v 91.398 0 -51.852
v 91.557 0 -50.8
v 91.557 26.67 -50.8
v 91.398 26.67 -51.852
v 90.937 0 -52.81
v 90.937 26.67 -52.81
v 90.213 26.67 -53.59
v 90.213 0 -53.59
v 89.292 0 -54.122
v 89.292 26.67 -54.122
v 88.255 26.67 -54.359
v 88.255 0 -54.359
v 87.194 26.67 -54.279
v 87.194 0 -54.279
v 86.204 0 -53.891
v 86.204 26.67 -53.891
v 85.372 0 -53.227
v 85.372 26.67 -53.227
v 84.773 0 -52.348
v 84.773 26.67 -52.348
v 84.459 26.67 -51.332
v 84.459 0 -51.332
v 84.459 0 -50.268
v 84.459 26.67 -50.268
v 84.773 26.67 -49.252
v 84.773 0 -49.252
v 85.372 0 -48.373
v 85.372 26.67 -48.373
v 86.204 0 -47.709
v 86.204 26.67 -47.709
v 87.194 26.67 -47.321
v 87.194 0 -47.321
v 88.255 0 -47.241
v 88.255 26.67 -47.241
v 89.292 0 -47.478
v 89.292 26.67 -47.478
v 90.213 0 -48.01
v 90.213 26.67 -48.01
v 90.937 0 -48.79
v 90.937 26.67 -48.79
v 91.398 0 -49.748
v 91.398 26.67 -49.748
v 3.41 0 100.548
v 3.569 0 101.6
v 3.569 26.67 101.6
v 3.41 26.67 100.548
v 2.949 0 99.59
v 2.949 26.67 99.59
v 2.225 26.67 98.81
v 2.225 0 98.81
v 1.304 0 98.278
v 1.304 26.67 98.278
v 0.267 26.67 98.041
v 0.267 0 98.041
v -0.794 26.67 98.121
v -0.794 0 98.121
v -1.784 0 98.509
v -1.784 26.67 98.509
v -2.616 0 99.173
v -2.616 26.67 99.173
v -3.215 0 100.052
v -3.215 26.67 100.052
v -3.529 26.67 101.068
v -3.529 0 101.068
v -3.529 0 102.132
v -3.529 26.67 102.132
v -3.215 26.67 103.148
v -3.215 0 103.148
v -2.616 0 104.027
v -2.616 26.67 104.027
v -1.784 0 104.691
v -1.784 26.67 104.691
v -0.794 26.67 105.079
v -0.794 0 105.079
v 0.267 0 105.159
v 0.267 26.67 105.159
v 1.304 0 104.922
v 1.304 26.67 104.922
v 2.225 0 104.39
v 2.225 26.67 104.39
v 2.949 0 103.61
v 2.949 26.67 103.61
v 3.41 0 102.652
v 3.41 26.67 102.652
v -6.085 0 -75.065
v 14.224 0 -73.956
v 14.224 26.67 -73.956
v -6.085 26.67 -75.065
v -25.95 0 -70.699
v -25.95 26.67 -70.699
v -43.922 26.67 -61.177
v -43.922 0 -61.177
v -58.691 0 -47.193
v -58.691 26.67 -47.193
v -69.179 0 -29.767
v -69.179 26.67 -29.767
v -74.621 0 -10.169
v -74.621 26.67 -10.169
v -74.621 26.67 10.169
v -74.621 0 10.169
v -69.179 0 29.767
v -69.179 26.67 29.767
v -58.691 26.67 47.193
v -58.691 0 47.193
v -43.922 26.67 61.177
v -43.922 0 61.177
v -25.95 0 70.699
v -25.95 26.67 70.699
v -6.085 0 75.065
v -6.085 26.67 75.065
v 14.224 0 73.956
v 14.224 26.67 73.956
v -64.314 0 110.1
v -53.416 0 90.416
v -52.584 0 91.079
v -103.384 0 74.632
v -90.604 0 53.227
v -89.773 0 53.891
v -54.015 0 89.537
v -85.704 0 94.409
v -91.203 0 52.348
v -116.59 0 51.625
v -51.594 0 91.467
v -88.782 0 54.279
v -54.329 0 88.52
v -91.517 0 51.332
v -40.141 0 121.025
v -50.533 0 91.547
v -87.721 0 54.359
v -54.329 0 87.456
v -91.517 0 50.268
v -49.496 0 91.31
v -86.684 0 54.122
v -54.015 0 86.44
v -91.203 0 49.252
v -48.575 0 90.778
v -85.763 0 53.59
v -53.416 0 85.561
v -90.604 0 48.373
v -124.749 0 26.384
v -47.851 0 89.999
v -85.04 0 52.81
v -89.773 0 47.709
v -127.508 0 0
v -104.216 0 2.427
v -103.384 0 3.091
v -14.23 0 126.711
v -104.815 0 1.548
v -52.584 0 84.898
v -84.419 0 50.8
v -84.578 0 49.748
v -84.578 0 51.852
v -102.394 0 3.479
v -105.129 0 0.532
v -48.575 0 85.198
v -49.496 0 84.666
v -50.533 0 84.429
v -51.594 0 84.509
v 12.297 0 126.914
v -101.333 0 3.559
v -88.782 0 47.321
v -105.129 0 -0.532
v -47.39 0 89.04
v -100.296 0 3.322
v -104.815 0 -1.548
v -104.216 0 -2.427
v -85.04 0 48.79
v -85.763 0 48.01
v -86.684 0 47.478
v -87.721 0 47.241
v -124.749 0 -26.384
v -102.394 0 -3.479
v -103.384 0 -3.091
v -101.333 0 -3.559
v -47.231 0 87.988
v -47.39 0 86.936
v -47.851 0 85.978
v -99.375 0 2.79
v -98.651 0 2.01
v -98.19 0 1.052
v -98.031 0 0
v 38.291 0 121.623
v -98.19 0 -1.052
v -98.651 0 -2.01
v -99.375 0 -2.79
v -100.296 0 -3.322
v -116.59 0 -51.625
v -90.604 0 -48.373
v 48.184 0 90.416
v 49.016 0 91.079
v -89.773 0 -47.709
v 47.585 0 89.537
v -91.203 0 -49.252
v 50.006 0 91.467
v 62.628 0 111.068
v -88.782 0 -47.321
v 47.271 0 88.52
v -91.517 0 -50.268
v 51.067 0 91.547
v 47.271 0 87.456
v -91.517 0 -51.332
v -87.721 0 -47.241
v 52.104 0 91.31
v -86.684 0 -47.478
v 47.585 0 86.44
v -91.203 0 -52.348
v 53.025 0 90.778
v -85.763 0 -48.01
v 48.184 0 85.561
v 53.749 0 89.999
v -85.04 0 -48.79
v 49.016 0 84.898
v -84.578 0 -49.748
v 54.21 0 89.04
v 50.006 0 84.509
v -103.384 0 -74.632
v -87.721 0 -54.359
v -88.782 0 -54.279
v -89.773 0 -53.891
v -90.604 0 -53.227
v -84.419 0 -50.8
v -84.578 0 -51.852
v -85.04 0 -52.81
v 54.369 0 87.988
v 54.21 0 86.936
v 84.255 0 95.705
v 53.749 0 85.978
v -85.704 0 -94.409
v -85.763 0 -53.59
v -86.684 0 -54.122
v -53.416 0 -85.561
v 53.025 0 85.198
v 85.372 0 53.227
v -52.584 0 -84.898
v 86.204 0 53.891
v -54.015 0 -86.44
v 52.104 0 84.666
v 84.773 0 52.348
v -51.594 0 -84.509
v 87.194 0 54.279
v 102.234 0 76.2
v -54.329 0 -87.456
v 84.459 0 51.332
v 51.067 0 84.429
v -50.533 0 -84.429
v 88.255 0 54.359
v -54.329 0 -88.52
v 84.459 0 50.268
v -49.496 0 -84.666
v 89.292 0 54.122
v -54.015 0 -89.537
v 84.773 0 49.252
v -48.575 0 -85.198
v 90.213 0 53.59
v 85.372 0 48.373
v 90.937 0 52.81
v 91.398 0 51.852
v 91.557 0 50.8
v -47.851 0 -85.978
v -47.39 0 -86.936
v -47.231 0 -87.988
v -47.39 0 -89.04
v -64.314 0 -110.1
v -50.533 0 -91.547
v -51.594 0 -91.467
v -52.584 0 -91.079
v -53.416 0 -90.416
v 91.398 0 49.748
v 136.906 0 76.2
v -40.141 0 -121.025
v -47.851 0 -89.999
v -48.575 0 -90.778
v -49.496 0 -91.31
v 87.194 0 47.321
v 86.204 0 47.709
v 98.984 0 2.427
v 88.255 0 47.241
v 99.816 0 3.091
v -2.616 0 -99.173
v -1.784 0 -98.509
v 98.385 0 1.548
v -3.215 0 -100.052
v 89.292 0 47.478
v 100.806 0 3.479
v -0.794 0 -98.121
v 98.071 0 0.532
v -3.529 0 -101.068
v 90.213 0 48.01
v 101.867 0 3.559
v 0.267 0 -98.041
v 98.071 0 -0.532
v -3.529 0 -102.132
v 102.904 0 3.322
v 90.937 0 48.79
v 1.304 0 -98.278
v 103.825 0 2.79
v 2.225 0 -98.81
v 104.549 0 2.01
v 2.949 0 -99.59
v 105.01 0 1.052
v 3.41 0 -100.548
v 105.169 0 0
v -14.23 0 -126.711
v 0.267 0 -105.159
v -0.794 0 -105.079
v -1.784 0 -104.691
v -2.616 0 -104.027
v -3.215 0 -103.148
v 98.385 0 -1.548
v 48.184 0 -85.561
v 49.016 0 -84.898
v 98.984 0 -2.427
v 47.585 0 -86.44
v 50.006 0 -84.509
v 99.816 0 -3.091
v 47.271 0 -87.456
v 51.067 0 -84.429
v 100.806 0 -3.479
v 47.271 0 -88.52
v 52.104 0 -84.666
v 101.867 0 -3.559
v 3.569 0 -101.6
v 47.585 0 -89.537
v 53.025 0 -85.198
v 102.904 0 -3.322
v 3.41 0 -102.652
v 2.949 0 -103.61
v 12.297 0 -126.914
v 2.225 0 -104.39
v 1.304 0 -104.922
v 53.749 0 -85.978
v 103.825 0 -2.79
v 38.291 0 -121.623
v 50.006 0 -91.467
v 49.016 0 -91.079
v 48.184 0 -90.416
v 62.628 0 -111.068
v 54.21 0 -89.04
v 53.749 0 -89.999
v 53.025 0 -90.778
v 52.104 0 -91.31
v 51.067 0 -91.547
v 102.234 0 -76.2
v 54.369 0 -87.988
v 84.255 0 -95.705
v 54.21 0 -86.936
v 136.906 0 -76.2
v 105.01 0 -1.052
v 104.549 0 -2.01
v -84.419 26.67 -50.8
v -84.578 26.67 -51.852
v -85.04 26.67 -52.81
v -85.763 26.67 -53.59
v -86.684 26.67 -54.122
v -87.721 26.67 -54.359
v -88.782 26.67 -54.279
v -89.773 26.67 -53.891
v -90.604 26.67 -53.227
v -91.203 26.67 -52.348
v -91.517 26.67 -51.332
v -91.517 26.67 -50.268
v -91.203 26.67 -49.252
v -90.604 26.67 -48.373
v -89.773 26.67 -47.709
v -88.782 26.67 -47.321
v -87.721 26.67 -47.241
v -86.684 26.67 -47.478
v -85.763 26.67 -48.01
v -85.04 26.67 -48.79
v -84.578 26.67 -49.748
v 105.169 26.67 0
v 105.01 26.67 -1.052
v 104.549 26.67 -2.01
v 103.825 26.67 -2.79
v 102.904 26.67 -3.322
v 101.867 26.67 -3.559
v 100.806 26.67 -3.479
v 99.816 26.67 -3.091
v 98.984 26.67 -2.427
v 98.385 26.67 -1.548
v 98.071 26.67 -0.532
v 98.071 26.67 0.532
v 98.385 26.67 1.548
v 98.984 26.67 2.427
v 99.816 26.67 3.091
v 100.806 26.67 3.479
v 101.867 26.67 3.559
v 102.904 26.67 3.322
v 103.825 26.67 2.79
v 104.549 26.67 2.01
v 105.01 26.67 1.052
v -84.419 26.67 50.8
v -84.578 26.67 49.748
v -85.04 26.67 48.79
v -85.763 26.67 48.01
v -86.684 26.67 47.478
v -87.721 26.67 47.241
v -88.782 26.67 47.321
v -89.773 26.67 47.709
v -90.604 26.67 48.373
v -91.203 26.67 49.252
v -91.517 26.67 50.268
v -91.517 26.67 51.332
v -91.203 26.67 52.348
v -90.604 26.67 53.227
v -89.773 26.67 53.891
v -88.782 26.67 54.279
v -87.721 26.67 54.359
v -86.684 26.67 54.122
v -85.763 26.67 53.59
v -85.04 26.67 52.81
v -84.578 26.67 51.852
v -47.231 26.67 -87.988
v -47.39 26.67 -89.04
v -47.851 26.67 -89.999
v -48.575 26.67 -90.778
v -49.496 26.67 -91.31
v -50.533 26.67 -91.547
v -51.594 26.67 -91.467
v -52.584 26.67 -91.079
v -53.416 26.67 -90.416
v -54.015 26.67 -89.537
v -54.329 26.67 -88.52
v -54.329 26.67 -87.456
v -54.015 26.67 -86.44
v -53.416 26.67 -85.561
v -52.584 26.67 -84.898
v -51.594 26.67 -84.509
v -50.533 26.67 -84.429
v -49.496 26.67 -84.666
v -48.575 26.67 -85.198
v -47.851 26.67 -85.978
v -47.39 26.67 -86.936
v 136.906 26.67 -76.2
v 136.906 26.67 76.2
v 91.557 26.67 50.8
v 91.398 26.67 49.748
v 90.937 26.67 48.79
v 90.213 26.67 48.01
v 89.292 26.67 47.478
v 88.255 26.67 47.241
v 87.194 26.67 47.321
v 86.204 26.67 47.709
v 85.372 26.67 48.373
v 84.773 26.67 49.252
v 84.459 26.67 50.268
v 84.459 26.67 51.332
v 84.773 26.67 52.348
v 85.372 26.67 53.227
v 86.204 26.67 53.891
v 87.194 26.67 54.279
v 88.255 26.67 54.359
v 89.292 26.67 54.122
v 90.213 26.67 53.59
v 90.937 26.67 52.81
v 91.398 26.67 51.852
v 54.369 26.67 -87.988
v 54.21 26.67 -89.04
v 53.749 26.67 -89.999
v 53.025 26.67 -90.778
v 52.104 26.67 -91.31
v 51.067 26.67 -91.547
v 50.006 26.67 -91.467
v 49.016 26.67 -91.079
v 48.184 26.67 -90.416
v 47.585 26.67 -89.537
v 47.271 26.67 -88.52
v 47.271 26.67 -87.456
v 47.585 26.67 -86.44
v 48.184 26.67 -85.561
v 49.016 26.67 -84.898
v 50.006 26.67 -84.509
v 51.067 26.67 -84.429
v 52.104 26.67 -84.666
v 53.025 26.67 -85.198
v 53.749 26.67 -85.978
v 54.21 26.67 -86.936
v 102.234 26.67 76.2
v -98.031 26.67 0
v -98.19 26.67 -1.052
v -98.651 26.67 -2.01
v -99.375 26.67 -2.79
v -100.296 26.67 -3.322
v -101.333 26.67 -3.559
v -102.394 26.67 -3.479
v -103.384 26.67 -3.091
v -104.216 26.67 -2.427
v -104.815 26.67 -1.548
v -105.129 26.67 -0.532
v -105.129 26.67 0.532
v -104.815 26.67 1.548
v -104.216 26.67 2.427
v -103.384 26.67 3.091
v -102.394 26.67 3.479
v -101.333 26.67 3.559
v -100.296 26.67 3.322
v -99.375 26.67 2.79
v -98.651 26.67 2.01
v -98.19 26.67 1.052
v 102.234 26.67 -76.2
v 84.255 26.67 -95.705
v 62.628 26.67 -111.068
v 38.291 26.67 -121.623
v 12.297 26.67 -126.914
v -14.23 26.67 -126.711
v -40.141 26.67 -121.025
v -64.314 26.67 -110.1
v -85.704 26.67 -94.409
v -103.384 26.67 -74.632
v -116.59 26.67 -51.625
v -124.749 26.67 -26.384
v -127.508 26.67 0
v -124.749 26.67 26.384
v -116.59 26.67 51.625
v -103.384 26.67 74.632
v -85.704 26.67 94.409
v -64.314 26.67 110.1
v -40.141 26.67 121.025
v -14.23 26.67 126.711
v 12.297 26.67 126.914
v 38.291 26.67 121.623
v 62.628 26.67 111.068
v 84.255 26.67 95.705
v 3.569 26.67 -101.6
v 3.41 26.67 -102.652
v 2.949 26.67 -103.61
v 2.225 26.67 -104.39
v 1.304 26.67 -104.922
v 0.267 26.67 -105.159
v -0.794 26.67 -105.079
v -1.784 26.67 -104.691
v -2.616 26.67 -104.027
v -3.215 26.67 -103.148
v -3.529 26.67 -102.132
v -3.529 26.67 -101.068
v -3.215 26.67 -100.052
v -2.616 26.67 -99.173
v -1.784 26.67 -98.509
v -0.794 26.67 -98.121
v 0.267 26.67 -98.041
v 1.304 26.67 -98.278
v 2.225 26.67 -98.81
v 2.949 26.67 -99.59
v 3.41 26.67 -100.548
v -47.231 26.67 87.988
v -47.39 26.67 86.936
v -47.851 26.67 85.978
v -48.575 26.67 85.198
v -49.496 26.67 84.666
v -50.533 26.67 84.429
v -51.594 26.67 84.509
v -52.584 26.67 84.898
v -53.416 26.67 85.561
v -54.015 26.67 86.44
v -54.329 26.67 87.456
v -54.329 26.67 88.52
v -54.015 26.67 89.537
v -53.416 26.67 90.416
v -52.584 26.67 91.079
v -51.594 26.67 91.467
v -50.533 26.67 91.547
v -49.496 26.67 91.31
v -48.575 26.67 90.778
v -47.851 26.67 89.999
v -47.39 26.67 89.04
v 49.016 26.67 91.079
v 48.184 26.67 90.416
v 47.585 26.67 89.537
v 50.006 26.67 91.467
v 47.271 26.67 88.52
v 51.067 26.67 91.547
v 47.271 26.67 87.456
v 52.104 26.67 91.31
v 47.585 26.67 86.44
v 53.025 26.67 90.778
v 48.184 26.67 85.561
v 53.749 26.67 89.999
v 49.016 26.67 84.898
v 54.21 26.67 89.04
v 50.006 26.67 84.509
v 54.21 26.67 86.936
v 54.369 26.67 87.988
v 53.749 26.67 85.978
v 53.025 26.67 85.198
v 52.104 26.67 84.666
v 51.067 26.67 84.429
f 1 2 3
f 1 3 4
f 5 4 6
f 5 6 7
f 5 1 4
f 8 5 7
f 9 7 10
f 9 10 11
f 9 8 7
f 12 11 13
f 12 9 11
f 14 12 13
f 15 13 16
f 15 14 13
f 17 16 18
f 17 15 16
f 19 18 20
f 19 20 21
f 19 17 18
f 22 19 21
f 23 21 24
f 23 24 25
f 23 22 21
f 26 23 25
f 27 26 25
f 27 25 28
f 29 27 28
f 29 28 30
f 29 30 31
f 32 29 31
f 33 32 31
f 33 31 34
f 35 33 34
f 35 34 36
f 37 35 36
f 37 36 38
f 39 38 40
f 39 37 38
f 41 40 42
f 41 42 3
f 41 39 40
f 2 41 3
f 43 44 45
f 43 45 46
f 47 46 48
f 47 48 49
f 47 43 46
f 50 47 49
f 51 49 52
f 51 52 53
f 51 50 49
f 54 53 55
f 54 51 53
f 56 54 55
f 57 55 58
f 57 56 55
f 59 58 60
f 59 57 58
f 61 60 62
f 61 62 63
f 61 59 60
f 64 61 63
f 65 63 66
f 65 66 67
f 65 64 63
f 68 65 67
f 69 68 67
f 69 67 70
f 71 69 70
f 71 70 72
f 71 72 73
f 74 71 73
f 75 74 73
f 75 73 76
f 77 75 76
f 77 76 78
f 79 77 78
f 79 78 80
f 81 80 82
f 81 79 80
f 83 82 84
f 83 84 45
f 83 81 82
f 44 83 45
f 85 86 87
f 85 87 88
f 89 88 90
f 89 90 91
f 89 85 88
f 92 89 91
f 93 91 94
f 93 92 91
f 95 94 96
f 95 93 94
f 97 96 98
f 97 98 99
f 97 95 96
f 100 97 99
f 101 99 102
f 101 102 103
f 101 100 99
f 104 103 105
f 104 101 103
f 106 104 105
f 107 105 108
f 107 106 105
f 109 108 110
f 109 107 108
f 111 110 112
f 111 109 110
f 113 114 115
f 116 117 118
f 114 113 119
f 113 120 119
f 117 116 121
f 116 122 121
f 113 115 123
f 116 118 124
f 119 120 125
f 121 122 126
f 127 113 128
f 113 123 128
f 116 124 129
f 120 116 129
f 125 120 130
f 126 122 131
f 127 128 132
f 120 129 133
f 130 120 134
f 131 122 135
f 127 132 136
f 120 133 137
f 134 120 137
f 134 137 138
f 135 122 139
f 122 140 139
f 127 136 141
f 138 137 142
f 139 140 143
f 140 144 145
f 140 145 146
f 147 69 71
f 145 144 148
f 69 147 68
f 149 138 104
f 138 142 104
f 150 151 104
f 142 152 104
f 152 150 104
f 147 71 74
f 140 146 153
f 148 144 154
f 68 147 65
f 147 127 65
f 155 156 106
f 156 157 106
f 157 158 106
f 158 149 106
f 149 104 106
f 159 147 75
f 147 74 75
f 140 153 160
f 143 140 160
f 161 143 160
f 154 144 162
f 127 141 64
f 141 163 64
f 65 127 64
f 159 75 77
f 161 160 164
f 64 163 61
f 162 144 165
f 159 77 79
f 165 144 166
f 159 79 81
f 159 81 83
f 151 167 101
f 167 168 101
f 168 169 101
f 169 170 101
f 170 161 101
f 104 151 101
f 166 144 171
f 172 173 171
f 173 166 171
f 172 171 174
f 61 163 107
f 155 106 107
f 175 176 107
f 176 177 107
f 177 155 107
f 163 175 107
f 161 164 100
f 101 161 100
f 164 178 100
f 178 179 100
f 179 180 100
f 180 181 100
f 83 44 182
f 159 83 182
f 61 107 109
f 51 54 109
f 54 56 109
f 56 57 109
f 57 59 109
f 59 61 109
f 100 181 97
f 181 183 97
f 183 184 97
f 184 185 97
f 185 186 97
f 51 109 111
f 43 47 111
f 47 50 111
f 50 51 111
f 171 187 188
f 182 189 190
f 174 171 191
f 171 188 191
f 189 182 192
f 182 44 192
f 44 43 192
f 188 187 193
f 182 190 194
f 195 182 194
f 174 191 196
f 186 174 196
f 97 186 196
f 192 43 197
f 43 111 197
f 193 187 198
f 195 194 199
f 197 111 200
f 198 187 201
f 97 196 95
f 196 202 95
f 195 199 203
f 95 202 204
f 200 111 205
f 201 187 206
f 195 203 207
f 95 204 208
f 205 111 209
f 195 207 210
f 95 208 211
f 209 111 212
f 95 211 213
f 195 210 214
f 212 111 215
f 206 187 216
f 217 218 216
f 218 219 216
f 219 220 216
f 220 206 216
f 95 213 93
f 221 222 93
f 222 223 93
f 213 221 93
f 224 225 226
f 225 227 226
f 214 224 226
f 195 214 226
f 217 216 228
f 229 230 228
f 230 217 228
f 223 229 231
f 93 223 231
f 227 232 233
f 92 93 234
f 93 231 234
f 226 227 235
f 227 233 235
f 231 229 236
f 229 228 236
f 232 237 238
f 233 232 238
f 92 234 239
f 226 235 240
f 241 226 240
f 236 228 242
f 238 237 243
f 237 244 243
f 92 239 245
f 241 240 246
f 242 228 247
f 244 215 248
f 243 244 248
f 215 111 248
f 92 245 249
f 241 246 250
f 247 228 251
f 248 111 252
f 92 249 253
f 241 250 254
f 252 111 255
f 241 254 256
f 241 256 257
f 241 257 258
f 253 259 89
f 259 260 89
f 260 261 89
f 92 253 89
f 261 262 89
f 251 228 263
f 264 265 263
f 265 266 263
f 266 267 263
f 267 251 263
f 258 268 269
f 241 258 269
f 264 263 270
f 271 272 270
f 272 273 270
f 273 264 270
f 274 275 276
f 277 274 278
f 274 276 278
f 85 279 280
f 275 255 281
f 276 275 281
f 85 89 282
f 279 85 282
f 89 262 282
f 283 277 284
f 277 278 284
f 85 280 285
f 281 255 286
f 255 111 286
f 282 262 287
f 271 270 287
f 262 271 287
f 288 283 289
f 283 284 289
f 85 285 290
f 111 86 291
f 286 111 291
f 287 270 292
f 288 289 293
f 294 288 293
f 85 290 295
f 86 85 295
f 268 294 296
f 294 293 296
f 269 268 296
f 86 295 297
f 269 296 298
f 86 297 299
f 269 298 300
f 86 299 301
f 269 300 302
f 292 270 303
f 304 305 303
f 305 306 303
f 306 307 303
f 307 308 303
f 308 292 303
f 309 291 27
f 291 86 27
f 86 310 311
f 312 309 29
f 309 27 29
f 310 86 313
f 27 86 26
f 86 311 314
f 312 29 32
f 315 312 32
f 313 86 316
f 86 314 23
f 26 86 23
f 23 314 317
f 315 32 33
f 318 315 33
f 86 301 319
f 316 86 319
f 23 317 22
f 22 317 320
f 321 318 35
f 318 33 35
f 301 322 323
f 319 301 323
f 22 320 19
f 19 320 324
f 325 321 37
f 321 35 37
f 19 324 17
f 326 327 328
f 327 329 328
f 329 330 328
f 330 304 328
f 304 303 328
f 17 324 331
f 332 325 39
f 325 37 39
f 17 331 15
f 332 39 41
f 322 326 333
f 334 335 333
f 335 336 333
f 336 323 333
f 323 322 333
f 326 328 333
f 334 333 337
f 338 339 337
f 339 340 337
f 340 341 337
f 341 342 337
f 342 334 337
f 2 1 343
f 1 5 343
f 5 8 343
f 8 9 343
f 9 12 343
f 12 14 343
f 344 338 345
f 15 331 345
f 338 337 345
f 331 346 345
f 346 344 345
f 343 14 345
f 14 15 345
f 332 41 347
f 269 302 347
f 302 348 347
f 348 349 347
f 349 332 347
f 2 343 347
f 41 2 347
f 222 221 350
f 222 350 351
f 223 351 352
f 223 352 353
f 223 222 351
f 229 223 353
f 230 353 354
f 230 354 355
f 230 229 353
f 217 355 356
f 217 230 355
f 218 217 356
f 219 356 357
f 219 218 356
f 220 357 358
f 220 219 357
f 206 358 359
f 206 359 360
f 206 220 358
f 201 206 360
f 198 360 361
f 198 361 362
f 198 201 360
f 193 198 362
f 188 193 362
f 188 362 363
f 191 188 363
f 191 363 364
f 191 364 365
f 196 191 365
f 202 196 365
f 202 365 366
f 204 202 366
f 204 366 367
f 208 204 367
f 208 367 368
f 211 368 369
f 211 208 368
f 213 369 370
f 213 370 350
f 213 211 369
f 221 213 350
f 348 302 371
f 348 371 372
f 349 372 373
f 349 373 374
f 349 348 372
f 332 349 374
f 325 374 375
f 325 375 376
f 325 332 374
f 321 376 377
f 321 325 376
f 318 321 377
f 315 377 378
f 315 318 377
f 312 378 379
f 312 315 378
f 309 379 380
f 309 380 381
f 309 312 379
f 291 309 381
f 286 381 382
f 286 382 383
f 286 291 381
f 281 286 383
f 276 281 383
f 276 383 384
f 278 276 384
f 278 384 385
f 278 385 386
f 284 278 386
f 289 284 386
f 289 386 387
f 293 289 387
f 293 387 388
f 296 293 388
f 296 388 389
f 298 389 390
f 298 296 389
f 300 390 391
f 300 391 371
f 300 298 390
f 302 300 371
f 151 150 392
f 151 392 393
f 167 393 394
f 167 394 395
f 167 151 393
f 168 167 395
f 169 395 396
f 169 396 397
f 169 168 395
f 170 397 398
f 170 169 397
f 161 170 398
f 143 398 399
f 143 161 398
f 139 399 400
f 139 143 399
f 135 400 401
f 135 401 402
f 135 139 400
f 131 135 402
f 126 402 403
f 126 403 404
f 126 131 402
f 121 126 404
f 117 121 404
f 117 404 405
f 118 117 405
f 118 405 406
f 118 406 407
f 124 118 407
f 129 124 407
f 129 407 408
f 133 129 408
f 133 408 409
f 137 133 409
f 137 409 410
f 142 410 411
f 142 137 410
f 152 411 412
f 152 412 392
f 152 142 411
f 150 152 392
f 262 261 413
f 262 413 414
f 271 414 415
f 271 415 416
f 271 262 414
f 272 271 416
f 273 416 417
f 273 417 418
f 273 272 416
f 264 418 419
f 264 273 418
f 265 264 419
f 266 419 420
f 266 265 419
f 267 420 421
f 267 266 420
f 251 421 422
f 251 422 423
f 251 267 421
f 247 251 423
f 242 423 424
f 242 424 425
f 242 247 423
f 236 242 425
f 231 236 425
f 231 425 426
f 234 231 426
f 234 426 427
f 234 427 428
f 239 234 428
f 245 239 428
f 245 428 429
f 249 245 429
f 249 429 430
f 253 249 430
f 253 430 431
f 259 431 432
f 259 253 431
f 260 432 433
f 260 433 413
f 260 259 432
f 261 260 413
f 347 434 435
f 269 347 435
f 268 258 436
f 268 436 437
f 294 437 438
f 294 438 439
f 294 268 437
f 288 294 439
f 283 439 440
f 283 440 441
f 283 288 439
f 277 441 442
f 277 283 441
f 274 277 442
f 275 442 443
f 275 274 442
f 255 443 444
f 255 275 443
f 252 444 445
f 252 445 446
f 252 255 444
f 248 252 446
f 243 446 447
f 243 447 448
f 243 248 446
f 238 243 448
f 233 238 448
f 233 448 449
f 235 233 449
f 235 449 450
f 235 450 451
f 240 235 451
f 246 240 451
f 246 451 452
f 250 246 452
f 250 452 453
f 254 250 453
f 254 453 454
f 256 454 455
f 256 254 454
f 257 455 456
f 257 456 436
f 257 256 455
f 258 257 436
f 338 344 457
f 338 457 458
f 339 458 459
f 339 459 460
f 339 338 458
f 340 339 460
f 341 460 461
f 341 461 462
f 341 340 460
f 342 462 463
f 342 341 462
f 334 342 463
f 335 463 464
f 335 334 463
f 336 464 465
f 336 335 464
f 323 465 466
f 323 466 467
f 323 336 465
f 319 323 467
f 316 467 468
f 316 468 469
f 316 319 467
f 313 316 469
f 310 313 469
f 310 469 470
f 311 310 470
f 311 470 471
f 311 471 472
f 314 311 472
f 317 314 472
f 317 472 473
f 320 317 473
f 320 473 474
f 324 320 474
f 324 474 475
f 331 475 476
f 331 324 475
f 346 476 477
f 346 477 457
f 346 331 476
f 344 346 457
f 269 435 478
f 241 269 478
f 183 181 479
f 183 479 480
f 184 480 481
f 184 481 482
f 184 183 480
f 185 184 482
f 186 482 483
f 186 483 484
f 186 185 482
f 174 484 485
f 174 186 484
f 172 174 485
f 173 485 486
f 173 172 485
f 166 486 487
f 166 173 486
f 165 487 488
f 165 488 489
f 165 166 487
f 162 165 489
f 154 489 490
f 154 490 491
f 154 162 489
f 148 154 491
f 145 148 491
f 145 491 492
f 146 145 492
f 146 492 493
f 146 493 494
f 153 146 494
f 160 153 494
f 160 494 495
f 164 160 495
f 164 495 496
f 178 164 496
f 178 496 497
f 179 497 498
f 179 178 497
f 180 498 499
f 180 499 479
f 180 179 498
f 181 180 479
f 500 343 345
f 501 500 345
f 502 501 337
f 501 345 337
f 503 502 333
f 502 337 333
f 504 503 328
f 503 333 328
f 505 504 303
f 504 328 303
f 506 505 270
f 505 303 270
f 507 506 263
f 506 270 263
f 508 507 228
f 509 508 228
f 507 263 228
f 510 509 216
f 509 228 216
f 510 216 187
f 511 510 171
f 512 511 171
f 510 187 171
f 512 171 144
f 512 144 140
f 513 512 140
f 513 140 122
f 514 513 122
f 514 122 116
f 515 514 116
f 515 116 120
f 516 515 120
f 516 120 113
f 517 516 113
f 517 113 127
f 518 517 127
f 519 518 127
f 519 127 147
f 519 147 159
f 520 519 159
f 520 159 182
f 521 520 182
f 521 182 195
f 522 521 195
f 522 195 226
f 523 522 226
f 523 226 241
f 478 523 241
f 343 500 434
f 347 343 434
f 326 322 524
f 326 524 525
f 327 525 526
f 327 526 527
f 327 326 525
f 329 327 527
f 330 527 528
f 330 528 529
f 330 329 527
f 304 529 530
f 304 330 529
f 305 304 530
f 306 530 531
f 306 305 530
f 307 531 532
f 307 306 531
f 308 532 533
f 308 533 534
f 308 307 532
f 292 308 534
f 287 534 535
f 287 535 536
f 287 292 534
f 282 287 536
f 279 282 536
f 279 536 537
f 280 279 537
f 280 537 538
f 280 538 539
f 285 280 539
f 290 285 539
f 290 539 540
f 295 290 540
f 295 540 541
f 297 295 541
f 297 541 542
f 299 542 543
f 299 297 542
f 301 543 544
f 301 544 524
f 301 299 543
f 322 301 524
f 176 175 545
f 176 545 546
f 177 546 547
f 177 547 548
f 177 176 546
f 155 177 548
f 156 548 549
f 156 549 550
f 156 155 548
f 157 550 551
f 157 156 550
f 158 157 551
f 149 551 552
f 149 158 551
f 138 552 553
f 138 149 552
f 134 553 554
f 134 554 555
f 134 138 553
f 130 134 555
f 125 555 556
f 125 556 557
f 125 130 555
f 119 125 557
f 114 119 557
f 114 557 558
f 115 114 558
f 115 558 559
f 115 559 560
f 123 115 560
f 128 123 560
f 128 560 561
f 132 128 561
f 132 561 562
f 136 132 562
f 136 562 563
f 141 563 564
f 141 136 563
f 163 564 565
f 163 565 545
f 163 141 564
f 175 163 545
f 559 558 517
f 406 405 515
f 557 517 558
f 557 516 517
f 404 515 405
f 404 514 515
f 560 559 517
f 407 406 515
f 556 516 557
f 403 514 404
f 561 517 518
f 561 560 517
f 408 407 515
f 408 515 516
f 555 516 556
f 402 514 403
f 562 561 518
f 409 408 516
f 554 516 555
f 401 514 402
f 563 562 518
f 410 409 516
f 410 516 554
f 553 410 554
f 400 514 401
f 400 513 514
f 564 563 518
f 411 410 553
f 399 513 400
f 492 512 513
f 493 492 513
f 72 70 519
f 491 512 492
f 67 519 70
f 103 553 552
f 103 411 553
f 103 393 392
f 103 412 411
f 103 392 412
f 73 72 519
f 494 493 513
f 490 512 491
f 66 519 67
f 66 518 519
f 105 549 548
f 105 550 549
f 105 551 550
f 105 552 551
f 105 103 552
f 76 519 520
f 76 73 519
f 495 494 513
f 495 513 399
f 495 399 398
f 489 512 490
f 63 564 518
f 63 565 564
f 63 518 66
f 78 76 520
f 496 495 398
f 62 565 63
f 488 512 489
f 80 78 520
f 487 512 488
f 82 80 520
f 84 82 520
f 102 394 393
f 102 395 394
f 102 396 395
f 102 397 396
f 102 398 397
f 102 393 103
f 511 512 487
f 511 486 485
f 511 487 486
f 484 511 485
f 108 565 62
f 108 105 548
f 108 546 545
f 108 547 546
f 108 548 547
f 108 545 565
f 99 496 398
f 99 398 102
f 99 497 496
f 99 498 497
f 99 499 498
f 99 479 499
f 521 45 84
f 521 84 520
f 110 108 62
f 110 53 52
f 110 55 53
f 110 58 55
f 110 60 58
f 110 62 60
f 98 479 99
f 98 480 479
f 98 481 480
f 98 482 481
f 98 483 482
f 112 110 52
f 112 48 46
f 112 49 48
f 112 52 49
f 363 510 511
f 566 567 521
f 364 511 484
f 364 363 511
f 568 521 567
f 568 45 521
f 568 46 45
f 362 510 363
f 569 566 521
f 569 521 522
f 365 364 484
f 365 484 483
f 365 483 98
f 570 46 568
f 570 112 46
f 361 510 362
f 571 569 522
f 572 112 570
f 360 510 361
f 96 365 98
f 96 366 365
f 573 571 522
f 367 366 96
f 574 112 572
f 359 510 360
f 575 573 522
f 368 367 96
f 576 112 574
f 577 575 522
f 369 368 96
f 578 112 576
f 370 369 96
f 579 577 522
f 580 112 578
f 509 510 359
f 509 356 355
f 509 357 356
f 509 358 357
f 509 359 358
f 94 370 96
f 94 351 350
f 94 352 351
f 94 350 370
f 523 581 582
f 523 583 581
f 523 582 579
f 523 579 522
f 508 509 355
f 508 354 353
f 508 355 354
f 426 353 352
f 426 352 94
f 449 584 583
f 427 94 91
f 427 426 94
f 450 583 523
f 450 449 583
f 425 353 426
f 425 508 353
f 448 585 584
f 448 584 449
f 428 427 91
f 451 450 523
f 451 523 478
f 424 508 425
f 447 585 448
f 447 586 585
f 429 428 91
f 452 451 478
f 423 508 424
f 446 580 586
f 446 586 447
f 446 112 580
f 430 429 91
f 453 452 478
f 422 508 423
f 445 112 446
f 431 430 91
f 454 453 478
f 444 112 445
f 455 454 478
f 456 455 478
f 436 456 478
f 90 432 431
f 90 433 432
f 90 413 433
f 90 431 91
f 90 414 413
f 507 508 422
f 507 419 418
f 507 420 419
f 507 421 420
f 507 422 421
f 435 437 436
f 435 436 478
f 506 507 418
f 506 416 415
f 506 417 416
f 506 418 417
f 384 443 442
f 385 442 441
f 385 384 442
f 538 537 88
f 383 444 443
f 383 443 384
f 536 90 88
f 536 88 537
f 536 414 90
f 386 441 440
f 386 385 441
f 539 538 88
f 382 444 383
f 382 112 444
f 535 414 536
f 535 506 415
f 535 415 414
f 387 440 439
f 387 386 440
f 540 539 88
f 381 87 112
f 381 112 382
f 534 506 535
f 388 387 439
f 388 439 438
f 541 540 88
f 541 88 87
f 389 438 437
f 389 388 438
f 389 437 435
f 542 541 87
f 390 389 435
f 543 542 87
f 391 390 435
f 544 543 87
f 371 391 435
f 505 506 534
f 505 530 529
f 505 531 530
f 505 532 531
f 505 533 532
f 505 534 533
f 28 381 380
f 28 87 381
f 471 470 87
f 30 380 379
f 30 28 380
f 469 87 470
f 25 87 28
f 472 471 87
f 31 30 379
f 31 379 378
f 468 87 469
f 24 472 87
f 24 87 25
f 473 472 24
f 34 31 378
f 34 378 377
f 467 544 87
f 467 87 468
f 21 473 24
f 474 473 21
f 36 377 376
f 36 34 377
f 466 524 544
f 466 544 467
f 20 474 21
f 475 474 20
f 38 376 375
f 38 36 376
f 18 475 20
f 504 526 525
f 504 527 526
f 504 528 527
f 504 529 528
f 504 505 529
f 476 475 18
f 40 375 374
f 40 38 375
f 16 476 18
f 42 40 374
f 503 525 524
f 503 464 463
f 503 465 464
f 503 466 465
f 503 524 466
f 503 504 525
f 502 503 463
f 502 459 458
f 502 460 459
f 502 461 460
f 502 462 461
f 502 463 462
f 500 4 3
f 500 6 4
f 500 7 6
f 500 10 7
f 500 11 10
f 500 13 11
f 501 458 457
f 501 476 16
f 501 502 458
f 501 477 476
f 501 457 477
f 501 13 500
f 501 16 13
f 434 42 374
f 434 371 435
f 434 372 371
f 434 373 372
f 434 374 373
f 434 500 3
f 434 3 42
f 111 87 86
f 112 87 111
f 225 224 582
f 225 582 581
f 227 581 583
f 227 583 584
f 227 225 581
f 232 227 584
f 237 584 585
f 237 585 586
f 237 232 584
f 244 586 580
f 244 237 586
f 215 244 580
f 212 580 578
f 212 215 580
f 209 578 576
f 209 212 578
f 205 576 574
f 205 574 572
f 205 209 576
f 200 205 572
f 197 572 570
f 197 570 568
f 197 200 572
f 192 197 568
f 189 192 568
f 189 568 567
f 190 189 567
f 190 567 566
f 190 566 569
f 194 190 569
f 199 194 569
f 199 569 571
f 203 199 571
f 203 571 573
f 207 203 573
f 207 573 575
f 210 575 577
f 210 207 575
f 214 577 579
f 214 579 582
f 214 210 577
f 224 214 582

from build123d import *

# Parameters (mm, degrees)
SKETCH1_R           = 127.508
SKETCH1_R_2         = 75.311
SKETCH1_R_3         = 3.5687
BOSS_EXTRUDE1_DEPTH = 26.67
BOSS_EXTRUDE2_DEPTH = 26.67


with BuildPart() as part:
    # Sketch1 → Boss-Extrude1 (new body)
    with BuildSketch(Plane(origin=(0, 0, 0), x_dir=(1, 0, 0), z_dir=(0, 1, 0))):
        Circle(SKETCH1_R)
        Circle(SKETCH1_R_2, mode=Mode.SUBTRACT)
        with Locations((0, 101.6)):
            Circle(SKETCH1_R_3, mode=Mode.SUBTRACT)
        with Locations((50.8, 87.988181024)):
            Circle(SKETCH1_R_3, mode=Mode.SUBTRACT)
        with Locations((87.988181025, 50.8)):
            Circle(SKETCH1_R_3, mode=Mode.SUBTRACT)
        with Locations((101.6, 0)):
            Circle(SKETCH1_R_3, mode=Mode.SUBTRACT)
        with Locations((87.988181025, -50.8)):
            Circle(SKETCH1_R_3, mode=Mode.SUBTRACT)
        with Locations((50.8, -87.988181024)):
            Circle(SKETCH1_R_3, mode=Mode.SUBTRACT)
        with Locations((0, -101.6)):
            Circle(SKETCH1_R_3, mode=Mode.SUBTRACT)
        with Locations((-50.8, -87.988181025)):
            Circle(SKETCH1_R_3, mode=Mode.SUBTRACT)
        with Locations((-87.988181024, -50.8)):
            Circle(SKETCH1_R_3, mode=Mode.SUBTRACT)
        with Locations((-101.6, 0)):
            Circle(SKETCH1_R_3, mode=Mode.SUBTRACT)
        with Locations((-87.988181024, 50.8)):
            Circle(SKETCH1_R_3, mode=Mode.SUBTRACT)
        with Locations((-50.8, 87.988181024)):
            Circle(SKETCH1_R_3, mode=Mode.SUBTRACT)
    extrude(amount=BOSS_EXTRUDE1_DEPTH)

    # Sketch2 → Boss-Extrude2 (add, through all)
    with BuildSketch(Plane(origin=(0, 26.67, 0), x_dir=(1, 0, 0), z_dir=(0, 1, 0))):
        with BuildLine():
            Line((14.224, 73.955557905), (14.224, -73.955557905))
            ThreePointArc((14.224, -73.955557905), (75.311, 0), (14.224, 73.955557905))
        make_face()
        with BuildLine():
            Line((136.906, 76.2), (136.906, -76.2))
            Line((136.906, -76.2), (102.23429006, -76.2))
            ThreePointArc((102.23429006, -76.2), (127.508, 0), (102.23429006, 76.2))
            Line((102.23429006, 76.2), (136.906, 76.2))
        make_face()
    extrude(amount=-BOSS_EXTRUDE2_DEPTH)


solid = part.part
